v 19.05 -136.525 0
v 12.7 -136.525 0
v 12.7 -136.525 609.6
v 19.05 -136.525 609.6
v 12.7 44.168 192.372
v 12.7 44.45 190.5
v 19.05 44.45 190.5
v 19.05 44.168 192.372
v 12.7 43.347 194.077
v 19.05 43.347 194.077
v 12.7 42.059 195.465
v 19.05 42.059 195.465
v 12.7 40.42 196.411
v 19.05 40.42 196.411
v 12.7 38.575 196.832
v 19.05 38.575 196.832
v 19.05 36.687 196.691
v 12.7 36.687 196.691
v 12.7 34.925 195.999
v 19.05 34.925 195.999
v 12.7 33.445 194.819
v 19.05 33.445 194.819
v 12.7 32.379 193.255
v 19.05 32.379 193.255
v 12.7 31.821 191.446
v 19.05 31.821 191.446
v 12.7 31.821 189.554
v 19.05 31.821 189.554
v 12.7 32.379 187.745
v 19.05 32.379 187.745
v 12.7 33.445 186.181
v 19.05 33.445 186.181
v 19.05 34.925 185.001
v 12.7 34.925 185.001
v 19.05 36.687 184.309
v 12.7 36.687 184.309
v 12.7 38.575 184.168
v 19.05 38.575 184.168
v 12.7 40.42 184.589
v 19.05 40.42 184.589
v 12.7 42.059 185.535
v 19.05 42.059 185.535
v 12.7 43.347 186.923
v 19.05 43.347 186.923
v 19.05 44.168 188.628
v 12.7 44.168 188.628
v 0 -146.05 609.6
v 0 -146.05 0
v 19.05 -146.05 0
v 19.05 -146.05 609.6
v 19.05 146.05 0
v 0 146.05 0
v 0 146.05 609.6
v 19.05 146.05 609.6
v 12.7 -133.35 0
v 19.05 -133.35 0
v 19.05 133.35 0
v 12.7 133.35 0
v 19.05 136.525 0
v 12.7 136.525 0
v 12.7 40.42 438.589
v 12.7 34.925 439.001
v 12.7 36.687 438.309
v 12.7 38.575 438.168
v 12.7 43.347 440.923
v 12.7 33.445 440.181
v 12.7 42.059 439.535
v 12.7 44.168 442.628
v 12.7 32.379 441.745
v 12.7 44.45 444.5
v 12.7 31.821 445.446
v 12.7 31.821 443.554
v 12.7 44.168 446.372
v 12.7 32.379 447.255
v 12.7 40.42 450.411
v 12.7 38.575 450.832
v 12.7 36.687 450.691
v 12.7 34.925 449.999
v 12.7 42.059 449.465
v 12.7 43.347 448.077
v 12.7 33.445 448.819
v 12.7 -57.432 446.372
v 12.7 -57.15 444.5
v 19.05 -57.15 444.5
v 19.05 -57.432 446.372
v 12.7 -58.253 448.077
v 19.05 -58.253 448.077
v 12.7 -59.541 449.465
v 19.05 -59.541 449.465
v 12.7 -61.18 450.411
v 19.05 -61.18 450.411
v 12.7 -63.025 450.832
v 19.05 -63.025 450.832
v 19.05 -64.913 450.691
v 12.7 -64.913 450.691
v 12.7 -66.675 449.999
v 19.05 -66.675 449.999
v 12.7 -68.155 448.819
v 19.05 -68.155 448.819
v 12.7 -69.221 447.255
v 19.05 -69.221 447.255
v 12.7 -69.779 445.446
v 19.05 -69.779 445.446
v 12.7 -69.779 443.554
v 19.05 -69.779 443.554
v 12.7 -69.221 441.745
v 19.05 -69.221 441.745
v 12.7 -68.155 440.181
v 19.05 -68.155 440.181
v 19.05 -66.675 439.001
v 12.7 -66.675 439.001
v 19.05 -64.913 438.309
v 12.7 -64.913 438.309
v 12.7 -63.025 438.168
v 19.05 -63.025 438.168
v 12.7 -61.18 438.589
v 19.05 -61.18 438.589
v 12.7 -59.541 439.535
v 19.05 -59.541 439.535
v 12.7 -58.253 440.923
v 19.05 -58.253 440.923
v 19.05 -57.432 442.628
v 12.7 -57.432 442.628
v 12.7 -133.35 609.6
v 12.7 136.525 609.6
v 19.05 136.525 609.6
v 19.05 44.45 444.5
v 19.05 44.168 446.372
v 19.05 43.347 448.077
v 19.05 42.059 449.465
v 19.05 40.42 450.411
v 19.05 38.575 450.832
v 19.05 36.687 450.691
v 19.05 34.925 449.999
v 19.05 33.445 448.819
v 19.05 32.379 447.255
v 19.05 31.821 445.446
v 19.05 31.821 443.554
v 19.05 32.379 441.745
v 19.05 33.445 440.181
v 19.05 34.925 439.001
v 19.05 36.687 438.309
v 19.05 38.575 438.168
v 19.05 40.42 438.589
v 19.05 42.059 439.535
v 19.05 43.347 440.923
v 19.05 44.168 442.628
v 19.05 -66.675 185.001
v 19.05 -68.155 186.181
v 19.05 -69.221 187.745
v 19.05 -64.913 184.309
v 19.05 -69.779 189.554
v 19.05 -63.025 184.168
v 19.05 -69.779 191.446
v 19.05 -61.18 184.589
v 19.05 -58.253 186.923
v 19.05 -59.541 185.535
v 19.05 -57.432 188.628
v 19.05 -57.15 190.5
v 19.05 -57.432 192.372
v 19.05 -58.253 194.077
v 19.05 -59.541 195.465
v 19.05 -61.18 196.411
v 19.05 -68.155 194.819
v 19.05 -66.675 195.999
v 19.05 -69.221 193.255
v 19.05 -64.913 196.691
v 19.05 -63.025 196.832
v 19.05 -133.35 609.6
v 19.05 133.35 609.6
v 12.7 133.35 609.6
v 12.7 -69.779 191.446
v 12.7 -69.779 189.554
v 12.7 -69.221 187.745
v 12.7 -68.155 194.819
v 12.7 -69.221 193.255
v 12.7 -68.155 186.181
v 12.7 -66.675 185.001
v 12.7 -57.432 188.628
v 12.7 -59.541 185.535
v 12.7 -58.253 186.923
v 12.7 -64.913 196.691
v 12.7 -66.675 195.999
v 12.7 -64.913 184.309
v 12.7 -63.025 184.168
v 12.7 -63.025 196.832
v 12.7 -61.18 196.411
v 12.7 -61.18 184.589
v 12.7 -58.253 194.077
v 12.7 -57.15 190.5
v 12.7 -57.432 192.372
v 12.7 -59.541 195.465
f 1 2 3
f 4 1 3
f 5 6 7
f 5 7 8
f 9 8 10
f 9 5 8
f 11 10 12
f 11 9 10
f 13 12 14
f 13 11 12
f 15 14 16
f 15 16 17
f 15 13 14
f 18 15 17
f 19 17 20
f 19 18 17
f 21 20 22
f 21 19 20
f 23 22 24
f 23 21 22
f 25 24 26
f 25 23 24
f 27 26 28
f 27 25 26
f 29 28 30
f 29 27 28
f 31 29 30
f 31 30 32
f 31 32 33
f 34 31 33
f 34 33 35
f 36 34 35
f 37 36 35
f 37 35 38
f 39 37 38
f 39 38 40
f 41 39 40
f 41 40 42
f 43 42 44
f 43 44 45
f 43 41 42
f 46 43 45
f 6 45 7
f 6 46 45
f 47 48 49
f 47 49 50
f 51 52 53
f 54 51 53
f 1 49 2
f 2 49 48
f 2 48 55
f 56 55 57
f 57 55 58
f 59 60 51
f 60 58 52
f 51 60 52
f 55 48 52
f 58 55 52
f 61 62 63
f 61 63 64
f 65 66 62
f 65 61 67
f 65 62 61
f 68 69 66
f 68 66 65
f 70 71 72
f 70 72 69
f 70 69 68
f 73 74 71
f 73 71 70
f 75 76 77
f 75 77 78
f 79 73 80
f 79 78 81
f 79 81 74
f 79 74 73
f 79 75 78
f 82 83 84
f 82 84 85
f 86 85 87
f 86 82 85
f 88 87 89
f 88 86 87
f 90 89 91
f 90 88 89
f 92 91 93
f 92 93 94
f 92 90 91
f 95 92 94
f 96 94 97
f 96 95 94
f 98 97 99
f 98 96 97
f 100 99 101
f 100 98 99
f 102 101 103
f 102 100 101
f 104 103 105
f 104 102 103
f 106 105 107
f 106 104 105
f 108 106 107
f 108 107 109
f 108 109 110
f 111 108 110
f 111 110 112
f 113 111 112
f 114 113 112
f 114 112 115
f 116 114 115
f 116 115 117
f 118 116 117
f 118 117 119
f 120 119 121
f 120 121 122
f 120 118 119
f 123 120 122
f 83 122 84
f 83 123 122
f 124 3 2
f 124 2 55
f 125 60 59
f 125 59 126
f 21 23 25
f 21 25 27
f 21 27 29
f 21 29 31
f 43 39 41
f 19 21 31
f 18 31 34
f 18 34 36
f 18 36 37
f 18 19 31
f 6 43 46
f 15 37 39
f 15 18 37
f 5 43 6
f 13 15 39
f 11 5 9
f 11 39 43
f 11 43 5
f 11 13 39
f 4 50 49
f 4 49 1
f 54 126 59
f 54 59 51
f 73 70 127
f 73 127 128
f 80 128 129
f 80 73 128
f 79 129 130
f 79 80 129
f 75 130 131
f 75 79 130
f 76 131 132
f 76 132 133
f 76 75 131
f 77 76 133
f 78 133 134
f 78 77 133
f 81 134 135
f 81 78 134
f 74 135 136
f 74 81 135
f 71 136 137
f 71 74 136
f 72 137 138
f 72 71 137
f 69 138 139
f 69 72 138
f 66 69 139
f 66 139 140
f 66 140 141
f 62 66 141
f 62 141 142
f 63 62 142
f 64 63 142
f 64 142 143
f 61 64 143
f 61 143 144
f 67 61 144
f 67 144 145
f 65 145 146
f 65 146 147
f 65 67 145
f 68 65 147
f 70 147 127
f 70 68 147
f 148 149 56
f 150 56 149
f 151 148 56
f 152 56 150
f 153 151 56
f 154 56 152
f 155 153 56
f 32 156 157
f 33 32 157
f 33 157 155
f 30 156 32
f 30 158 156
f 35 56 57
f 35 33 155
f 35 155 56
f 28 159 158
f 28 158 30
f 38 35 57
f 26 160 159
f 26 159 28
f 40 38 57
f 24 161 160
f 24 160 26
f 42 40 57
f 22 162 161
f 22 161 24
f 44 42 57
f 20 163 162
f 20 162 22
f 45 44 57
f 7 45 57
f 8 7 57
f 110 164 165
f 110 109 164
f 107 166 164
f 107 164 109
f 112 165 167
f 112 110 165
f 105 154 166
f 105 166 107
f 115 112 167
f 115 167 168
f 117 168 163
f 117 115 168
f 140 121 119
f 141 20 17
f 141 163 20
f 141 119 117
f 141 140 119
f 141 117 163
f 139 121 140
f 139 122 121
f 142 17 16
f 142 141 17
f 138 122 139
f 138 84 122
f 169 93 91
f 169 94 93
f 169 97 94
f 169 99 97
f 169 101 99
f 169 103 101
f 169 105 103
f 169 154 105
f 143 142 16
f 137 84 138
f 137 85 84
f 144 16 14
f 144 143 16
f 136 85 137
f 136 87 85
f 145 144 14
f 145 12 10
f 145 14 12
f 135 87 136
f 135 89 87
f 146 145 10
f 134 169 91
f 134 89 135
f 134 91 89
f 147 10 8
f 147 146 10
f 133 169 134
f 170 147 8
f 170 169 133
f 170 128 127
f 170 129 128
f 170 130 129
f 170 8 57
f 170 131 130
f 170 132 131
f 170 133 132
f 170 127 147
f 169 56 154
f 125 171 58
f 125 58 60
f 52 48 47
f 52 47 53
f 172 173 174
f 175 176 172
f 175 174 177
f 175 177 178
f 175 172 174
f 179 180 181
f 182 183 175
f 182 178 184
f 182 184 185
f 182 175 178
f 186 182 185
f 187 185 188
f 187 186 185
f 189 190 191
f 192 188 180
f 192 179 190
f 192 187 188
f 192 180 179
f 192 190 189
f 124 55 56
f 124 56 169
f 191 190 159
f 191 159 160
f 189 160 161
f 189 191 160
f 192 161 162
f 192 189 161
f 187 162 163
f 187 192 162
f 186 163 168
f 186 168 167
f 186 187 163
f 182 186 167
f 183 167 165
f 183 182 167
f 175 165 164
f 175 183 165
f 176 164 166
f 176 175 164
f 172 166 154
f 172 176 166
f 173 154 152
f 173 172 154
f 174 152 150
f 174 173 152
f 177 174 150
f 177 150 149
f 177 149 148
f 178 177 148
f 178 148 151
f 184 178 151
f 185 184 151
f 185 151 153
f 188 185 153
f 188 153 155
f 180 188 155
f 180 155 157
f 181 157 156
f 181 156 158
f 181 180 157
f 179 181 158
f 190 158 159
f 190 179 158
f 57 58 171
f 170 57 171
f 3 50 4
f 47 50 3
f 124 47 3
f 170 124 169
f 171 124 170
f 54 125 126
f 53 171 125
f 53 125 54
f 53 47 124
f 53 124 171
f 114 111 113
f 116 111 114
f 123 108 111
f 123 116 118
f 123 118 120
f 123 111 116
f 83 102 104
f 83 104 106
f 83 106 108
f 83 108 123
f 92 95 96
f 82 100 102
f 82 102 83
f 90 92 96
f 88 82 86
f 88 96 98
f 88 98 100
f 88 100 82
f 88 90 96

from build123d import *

# Parameters (mm, degrees)
SKETCH_W          = 292.1
SKETCH_H          = 609.6
PAD_DEPTH         = 19.05
BOX_W             = 3.175
BOX_H             = 609.6
BOX_DEPTH         = 6.35
BOX001_W          = 3.175
BOX001_H          = 609.6
BOX001_DEPTH      = 6.35
CYLINDER_R        = 6.35
CYLINDER_DEPTH    = 6.35
CYLINDER001_R     = 6.35
CYLINDER001_DEPTH = 6.35
CYLINDER002_R     = 6.35
CYLINDER002_DEPTH = 6.35
CYLINDER003_R     = 6.35
CYLINDER003_DEPTH = 6.35


with BuildPart() as part:
    # Sketch → Pad (new body)
    with BuildSketch(Plane.YZ):
        with Locations((0, 304.8)):
            Rectangle(SKETCH_W, SKETCH_H)
    extrude(amount=PAD_DEPTH)

    # Box → Box (cut)
    with BuildSketch(Plane(origin=(12.7, -136.525, 0), x_dir=(0, 1, 0), z_dir=(1, 0, 0))):
        with Locations((1.5875, 304.8)):
            Rectangle(BOX_W, BOX_H)
    extrude(amount=BOX_DEPTH, mode=Mode.SUBTRACT)

    # Box001 → Box001 (cut)
    with BuildSketch(Plane(origin=(12.7, 133.35, 0), x_dir=(0, 1, 0), z_dir=(1, 0, 0))):
        with Locations((1.5875, 304.8)):
            Rectangle(BOX001_W, BOX001_H)
    extrude(amount=BOX001_DEPTH, mode=Mode.SUBTRACT)

    # Cylinder → Cylinder (cut)
    with BuildSketch(Plane(origin=(12.7, -63.5, 444.5), x_dir=(0, 1, 0), z_dir=(1, 0, 0))):
        Circle(CYLINDER_R)
    extrude(amount=CYLINDER_DEPTH, mode=Mode.SUBTRACT)

    # Cylinder001 → Cylinder001 (cut)
    with BuildSketch(Plane(origin=(12.7, 38.1, 444.5), x_dir=(0, 1, 0), z_dir=(1, 0, 0))):
        Circle(CYLINDER001_R)
    extrude(amount=CYLINDER001_DEPTH, mode=Mode.SUBTRACT)

    # Cylinder002 → Cylinder002 (cut)
    with BuildSketch(Plane(origin=(12.7, 38.1, 190.5), x_dir=(0, 1, 0), z_dir=(1, 0, 0))):
        Circle(CYLINDER002_R)
    extrude(amount=CYLINDER002_DEPTH, mode=Mode.SUBTRACT)

    # Cylinder003 → Cylinder003 (cut)
    with BuildSketch(Plane(origin=(12.7, -63.5, 190.5), x_dir=(0, 1, 0), z_dir=(1, 0, 0))):
        Circle(CYLINDER003_R)
    extrude(amount=CYLINDER003_DEPTH, mode=Mode.SUBTRACT)


solid = part.part
